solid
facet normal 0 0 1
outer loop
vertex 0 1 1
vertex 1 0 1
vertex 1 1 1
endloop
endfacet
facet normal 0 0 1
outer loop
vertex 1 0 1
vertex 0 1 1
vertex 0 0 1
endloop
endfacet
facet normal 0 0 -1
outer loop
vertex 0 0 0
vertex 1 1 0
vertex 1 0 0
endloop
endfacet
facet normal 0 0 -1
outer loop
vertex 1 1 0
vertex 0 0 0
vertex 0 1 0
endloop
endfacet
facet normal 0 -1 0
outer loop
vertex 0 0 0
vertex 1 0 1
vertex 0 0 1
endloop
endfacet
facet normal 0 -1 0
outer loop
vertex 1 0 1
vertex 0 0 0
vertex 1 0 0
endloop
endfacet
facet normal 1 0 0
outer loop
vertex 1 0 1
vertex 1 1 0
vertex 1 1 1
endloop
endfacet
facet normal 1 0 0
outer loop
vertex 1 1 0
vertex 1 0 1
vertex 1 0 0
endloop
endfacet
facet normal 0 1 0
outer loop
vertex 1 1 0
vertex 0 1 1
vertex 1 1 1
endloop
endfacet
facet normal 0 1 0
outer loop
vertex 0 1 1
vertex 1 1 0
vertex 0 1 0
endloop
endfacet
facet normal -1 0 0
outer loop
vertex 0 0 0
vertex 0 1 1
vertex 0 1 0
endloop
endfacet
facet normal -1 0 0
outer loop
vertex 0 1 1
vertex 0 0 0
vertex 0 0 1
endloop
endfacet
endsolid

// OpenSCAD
layout = [
[[13.5,1],1.5,"Grey"], // \
//start ROW 3
[[0,2],1.75,"Grey"], //CapsLock
];

cube(1);
